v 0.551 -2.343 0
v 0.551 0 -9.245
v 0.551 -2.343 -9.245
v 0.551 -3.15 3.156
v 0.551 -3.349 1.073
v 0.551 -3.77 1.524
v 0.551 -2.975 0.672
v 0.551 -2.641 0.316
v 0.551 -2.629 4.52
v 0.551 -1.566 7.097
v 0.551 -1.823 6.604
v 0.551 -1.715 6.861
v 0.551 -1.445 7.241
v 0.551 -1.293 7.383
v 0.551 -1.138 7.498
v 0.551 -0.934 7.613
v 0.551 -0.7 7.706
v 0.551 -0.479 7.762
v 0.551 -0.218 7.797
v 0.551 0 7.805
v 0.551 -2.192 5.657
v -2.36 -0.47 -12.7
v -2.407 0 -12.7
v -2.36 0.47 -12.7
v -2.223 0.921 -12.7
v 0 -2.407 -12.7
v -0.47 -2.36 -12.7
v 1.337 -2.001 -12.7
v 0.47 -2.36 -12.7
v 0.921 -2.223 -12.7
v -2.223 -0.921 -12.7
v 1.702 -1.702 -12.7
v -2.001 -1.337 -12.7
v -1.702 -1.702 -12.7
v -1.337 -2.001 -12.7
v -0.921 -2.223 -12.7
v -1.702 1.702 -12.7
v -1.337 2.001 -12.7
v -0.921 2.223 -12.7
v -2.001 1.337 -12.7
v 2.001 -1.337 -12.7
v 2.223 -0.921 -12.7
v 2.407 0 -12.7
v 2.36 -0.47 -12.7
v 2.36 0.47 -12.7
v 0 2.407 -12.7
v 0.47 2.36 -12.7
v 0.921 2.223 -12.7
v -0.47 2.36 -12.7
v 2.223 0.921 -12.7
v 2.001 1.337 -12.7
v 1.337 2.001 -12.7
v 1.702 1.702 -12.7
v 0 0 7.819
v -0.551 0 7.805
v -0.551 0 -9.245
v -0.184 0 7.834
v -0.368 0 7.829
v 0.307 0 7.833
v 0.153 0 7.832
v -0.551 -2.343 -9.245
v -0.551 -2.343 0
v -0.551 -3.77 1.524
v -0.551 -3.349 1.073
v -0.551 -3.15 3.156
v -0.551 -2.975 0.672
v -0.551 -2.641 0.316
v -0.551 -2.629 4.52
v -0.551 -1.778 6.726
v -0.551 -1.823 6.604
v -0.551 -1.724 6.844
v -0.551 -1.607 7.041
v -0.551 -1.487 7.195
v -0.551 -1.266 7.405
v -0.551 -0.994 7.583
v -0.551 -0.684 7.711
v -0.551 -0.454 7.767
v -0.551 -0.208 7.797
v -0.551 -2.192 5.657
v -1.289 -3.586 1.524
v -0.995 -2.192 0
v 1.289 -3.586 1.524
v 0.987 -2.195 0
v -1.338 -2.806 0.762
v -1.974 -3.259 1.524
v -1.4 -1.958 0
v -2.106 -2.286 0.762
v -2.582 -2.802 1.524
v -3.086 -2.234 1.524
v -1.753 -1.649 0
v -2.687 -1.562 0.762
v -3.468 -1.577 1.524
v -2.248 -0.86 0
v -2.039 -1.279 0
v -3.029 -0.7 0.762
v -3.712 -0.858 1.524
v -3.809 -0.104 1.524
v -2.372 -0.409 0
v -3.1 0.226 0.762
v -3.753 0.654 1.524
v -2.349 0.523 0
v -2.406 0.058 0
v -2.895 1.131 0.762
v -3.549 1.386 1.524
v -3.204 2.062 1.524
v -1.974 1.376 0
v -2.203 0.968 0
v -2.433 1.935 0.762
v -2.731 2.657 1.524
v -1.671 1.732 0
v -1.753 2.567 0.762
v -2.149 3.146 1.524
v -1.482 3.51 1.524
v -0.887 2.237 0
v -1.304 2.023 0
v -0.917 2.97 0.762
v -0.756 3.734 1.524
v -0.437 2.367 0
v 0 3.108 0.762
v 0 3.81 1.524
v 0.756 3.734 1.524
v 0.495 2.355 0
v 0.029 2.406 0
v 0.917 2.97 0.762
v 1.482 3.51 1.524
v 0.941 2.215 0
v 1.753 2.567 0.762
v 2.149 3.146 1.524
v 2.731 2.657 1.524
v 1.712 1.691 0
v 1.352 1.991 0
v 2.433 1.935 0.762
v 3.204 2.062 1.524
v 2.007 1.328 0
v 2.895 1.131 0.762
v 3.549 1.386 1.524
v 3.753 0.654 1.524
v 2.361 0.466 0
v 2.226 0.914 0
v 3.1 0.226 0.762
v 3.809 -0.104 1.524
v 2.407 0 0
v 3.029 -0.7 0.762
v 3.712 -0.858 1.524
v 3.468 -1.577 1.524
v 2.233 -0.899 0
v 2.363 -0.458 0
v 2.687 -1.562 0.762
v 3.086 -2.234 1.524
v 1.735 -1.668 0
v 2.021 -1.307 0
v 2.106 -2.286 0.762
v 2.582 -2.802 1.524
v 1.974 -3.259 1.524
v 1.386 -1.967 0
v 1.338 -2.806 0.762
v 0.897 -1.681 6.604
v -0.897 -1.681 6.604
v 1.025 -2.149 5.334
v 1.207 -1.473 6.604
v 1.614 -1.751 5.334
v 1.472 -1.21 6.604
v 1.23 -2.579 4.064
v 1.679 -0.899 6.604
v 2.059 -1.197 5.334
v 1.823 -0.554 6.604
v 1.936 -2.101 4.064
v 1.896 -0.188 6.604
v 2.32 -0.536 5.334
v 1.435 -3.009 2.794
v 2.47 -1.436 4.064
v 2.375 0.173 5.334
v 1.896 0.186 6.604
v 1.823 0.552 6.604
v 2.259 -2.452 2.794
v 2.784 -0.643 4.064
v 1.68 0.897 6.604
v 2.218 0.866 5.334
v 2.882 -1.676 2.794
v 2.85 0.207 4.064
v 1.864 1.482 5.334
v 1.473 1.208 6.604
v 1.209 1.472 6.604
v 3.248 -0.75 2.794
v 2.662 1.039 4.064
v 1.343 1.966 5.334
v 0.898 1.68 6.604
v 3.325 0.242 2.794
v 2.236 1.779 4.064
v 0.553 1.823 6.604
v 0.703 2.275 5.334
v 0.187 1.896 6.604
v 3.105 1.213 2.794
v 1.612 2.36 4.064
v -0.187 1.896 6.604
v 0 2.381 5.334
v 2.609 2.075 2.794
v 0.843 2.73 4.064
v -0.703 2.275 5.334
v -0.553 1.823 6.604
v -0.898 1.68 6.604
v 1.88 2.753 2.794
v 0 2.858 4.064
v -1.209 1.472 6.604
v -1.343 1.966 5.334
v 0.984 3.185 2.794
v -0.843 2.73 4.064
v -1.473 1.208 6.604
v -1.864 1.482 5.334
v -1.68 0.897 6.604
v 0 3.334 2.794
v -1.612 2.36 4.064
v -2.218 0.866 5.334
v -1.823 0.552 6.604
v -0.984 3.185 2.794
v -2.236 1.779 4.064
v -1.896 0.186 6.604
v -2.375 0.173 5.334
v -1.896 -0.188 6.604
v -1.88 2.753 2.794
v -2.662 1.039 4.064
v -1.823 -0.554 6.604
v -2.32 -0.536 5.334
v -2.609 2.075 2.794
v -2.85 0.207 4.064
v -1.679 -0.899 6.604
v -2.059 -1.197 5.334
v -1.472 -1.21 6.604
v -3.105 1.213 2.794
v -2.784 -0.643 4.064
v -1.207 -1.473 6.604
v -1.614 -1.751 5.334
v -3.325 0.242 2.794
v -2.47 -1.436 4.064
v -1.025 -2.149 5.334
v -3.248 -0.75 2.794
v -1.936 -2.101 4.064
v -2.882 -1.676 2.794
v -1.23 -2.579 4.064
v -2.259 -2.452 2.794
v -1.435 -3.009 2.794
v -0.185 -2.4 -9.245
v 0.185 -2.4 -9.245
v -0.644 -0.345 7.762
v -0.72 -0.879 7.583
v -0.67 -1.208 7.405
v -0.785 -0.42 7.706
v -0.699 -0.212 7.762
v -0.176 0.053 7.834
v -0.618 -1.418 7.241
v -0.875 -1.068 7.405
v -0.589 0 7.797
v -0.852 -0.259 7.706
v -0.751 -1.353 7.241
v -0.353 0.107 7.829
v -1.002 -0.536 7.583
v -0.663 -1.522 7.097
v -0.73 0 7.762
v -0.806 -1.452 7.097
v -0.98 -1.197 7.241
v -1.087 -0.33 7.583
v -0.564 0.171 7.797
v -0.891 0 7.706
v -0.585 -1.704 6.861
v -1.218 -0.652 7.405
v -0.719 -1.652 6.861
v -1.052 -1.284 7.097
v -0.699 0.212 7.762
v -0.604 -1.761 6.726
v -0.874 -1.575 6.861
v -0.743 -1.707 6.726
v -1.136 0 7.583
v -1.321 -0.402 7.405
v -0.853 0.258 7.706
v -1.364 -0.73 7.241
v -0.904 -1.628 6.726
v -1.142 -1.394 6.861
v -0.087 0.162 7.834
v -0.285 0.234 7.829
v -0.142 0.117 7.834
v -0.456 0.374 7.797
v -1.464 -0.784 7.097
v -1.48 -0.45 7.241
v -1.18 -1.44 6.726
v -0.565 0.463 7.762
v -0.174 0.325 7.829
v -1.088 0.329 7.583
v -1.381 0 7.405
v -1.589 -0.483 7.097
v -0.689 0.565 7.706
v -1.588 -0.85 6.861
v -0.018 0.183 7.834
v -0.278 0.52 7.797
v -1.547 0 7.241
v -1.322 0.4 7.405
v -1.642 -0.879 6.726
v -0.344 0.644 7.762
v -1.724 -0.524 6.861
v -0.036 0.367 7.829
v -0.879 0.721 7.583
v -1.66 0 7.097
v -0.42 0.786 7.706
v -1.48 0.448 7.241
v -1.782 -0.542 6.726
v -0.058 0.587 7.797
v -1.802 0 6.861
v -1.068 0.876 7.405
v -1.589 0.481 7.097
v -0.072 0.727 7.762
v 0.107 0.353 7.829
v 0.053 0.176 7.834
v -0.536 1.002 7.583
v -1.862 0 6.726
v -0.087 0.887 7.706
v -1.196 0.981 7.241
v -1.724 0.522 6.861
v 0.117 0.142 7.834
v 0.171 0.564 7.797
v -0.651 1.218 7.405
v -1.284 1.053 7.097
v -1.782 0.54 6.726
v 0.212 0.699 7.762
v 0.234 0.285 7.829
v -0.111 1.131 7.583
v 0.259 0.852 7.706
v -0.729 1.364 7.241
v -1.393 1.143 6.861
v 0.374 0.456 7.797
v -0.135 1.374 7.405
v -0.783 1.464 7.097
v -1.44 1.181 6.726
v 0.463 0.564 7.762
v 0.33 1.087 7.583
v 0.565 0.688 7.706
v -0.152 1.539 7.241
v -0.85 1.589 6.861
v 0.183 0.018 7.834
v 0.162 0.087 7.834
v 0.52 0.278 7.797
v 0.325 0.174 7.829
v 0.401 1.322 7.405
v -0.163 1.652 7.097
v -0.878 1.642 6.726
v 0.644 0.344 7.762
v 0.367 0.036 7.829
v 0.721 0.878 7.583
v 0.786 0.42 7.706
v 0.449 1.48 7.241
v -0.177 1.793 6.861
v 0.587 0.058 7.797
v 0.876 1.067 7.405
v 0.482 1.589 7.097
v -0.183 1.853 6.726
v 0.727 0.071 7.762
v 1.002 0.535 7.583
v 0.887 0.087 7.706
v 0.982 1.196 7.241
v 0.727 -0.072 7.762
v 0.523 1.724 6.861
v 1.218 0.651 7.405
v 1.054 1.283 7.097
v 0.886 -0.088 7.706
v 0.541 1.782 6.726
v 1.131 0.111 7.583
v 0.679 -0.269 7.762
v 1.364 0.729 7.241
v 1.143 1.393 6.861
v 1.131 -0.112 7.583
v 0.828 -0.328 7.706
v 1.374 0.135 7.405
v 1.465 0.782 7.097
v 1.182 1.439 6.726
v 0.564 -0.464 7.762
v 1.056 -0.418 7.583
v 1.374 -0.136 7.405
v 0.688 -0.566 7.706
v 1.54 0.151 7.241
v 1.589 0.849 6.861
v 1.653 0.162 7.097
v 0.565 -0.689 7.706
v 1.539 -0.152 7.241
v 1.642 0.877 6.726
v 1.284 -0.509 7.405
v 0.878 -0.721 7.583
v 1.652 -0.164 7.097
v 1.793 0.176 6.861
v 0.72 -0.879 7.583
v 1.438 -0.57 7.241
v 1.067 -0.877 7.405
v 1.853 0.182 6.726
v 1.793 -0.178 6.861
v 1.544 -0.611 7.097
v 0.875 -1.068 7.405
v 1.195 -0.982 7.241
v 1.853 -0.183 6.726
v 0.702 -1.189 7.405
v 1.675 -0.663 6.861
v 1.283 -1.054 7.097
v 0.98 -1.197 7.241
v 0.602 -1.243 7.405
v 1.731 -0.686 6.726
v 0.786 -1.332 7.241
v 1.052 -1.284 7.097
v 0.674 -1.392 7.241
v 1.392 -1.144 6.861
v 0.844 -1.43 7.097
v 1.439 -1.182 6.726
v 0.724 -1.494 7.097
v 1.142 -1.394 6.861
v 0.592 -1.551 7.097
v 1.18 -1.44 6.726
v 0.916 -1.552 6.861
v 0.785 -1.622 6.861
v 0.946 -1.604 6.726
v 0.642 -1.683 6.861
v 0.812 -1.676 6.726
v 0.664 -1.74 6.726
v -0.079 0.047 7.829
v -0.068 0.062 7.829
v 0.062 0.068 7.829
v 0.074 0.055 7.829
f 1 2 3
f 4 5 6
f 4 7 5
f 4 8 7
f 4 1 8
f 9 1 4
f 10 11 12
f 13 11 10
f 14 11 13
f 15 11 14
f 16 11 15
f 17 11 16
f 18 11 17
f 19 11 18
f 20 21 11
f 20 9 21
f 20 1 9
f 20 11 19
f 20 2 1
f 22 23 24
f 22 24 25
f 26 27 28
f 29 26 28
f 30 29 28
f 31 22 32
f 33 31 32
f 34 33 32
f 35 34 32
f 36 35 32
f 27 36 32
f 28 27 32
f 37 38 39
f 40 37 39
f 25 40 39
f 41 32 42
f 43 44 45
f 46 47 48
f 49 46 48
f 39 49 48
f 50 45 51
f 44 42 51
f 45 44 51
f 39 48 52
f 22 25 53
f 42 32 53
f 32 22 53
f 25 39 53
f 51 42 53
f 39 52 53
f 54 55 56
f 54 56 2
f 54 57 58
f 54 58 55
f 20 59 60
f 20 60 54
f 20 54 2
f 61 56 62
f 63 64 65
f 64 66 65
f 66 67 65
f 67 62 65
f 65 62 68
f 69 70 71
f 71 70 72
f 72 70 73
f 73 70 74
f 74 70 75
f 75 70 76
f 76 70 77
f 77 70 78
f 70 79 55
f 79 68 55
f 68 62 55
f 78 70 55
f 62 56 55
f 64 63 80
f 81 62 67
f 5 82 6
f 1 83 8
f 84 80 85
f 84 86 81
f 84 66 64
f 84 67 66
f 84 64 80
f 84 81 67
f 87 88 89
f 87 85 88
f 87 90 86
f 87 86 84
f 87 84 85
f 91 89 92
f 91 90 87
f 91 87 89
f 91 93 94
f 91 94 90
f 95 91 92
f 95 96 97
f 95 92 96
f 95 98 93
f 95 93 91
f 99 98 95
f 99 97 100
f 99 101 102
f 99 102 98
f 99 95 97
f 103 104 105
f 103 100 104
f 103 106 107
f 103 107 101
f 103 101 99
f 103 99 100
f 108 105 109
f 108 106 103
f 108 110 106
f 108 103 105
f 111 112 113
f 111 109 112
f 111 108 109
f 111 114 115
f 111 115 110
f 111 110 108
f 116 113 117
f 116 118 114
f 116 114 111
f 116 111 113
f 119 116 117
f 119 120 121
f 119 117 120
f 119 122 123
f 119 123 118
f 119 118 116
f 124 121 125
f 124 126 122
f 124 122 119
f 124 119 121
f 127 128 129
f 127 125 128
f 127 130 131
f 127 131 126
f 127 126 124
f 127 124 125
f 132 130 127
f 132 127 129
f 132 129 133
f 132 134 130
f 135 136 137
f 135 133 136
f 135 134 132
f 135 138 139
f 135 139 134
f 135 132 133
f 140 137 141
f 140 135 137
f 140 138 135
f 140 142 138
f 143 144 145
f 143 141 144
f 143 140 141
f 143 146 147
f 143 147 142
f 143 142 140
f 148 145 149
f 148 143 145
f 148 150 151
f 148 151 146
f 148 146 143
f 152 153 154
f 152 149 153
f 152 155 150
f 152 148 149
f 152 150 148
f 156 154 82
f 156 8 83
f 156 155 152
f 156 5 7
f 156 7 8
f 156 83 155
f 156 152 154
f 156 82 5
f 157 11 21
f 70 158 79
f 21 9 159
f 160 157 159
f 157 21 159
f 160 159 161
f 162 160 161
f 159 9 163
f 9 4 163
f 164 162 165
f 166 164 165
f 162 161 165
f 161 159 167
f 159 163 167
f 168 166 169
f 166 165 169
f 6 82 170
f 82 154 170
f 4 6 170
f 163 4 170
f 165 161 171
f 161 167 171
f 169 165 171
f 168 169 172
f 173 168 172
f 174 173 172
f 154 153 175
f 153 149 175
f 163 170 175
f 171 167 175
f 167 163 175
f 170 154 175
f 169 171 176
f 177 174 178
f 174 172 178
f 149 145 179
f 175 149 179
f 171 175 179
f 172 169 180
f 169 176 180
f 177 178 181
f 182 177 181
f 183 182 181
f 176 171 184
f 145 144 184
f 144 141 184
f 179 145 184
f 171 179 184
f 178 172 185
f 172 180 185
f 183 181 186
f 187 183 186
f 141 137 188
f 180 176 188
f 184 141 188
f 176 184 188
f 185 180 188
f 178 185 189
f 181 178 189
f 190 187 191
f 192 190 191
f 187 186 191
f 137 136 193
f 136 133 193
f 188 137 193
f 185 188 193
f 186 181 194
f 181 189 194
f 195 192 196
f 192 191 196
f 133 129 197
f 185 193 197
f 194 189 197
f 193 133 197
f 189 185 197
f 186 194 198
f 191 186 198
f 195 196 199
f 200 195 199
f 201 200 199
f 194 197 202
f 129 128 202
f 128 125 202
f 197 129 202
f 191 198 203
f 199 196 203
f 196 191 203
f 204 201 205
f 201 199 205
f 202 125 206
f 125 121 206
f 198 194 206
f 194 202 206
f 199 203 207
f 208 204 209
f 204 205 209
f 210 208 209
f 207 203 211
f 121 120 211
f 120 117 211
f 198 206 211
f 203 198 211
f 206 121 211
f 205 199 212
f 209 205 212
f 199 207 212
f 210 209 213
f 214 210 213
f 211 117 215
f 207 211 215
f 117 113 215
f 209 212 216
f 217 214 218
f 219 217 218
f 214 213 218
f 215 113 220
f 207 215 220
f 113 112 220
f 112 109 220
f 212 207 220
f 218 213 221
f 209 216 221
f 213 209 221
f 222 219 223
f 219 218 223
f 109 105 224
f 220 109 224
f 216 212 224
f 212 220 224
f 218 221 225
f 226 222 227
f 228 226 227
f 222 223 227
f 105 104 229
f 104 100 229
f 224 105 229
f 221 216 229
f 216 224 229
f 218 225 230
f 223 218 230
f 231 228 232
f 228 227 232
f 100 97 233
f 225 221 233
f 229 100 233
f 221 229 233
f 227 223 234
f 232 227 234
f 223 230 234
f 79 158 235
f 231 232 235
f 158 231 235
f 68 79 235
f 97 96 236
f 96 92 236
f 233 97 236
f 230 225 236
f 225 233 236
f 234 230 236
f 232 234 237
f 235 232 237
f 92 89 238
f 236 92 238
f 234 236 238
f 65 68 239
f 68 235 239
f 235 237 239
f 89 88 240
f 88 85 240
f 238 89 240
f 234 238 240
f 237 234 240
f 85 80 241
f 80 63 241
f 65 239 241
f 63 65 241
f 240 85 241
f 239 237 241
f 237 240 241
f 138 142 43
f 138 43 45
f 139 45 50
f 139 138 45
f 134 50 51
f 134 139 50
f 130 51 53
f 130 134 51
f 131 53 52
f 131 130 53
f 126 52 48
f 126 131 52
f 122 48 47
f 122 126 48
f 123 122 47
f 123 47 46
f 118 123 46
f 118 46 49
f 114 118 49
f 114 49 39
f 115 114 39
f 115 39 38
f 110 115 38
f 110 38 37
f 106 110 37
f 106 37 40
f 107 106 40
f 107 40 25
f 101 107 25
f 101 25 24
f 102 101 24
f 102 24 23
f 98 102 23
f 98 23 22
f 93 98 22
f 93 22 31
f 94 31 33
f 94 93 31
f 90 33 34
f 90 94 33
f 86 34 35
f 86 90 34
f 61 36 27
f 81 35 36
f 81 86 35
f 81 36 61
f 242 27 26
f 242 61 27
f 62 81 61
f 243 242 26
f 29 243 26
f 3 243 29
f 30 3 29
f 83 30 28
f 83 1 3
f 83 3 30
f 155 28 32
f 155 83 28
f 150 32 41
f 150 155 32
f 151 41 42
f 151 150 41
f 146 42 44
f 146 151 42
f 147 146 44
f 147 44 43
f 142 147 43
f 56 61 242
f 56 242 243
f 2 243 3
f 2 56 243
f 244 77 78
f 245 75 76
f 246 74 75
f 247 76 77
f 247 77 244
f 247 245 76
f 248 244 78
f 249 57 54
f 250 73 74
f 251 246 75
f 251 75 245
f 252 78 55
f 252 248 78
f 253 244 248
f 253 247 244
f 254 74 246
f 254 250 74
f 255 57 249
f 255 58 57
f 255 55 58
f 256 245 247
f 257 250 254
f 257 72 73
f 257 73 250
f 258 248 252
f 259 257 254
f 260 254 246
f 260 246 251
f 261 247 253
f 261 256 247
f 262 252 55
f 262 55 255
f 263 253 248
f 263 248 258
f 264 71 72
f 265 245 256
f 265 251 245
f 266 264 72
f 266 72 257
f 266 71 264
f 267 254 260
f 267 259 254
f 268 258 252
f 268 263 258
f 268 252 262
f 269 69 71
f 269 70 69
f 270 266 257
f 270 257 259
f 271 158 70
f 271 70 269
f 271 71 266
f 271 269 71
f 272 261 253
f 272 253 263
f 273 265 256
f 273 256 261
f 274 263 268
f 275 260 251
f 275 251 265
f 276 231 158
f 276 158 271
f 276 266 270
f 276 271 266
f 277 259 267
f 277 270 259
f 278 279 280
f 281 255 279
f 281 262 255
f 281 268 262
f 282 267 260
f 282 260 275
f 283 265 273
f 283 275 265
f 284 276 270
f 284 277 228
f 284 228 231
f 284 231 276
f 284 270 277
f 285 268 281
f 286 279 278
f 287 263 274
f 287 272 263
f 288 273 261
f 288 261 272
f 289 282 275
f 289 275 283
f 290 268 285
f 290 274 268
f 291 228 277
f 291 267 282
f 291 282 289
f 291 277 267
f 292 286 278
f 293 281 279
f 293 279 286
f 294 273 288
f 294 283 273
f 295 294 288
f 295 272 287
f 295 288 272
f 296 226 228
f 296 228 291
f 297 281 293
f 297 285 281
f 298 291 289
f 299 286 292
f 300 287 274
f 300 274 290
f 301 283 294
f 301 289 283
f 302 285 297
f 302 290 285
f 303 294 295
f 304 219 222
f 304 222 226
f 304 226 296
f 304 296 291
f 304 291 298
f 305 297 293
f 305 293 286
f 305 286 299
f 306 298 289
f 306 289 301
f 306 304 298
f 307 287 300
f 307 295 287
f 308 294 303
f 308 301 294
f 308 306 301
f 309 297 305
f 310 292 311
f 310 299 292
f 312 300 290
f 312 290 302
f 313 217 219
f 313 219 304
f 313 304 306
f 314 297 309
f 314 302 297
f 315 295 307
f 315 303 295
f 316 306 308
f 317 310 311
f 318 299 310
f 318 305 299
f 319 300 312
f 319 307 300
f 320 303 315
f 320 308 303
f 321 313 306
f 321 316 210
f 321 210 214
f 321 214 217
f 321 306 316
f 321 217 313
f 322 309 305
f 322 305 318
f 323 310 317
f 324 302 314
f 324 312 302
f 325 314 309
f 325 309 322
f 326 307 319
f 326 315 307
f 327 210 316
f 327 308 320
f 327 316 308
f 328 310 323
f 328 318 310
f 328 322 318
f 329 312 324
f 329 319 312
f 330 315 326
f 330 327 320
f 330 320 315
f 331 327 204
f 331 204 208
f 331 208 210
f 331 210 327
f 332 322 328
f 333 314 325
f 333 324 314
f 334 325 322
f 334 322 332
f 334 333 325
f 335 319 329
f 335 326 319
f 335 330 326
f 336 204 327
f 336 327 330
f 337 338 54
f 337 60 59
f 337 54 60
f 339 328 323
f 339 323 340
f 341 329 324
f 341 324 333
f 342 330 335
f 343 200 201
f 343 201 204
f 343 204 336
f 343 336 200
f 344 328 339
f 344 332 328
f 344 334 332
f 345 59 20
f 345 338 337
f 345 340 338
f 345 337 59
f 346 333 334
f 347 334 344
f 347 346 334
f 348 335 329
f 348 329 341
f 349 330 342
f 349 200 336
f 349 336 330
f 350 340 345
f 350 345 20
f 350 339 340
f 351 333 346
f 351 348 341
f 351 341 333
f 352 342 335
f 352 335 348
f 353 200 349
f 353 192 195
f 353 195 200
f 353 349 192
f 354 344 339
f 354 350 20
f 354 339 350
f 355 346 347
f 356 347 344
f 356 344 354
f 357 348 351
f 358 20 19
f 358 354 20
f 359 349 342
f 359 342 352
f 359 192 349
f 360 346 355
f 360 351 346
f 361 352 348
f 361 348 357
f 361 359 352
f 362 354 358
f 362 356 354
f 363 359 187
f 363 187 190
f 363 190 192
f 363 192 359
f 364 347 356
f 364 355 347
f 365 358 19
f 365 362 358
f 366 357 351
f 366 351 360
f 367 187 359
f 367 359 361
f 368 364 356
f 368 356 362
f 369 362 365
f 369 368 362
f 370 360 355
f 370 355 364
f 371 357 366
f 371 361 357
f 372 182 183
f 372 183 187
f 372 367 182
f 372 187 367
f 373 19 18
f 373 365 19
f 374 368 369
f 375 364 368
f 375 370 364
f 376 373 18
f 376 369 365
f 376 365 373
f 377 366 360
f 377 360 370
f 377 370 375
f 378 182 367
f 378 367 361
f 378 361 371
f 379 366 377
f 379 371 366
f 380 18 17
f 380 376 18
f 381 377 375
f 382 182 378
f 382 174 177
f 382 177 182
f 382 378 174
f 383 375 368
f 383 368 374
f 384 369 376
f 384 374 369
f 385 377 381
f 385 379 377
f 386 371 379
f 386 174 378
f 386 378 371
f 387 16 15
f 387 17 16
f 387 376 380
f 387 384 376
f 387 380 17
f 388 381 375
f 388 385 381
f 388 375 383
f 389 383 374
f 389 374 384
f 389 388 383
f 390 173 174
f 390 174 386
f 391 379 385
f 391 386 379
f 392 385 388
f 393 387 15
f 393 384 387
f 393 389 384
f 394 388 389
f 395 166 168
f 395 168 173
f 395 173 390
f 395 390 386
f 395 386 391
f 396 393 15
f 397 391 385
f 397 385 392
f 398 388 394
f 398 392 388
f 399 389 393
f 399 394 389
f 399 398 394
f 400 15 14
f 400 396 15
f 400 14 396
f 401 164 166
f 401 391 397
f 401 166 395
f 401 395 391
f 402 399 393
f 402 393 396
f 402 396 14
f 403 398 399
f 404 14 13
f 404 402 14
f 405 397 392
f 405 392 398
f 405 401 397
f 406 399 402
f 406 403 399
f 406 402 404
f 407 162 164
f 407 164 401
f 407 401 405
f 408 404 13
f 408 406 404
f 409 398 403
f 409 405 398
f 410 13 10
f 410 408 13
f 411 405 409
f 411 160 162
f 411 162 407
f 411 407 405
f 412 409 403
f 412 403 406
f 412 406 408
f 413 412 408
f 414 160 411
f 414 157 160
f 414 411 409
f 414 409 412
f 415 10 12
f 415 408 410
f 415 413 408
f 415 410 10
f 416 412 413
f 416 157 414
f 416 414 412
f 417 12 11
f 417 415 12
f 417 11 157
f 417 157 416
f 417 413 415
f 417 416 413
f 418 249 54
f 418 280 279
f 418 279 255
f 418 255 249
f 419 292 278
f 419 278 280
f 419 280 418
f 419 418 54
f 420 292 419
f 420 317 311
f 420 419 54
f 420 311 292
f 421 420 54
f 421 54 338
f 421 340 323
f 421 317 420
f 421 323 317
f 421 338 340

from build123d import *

# Parameters (mm, degrees)
F4_R      = 1.905
F2_R      = 3.81
F5_FACE_R = 3.81
F0_R      = 2.40665
F7_DEPTH  = 12.7
F12_W     = 1.1028264416
F12_H     = 38.8027336448
F13_DEPTH = 25.4


with BuildPart() as f5:
    # F4 (on offset) → F5 section 0
    with BuildSketch(Plane.XY.offset(6.604)):
        Circle(F4_R)
    # F2 (on offset) → F5 section 1
    with BuildSketch(Plane.XY.offset(1.524)):
        Circle(F2_R)
    loft()

    # F5_face (on face) → F6 section 0
    with BuildSketch(Plane(origin=(0, 0, 1.524), x_dir=(1, 0, 0), z_dir=(0, 0, -1))):
        Circle(F5_FACE_R)
    # F0 (on Top) → F6 section 1
    with BuildSketch(Plane.XY):
        Circle(F0_R)
    loft()

    # F0 (on Top) → F7 (join)
    with BuildSketch(Plane.XY):
        Circle(F0_R)
    extrude(amount=-F7_DEPTH)

    # F9 (on Front) → F11 (revolve)
    with BuildSketch(Plane.XZ):
        with BuildLine():
            Line((0, 6.604), (0, 7.8187098284))
            ThreePointArc((0, 7.8187098284), (-1.1744726921, 7.5594693104), (-1.905, 6.604))
            Line((-1.905, 6.604), (0, 6.604))
        make_face()
    revolve(axis=Axis((0, 0, 7.2099673588), (0, 0, -1)))

    # F12 (on Front) → F13 (cut)
    with BuildSketch(Plane.XZ):
        with Locations((0, 10.1560307667)):
            Rectangle(F12_W, F12_H)
    extrude(amount=F13_DEPTH, mode=Mode.SUBTRACT)


solid = f5.part
